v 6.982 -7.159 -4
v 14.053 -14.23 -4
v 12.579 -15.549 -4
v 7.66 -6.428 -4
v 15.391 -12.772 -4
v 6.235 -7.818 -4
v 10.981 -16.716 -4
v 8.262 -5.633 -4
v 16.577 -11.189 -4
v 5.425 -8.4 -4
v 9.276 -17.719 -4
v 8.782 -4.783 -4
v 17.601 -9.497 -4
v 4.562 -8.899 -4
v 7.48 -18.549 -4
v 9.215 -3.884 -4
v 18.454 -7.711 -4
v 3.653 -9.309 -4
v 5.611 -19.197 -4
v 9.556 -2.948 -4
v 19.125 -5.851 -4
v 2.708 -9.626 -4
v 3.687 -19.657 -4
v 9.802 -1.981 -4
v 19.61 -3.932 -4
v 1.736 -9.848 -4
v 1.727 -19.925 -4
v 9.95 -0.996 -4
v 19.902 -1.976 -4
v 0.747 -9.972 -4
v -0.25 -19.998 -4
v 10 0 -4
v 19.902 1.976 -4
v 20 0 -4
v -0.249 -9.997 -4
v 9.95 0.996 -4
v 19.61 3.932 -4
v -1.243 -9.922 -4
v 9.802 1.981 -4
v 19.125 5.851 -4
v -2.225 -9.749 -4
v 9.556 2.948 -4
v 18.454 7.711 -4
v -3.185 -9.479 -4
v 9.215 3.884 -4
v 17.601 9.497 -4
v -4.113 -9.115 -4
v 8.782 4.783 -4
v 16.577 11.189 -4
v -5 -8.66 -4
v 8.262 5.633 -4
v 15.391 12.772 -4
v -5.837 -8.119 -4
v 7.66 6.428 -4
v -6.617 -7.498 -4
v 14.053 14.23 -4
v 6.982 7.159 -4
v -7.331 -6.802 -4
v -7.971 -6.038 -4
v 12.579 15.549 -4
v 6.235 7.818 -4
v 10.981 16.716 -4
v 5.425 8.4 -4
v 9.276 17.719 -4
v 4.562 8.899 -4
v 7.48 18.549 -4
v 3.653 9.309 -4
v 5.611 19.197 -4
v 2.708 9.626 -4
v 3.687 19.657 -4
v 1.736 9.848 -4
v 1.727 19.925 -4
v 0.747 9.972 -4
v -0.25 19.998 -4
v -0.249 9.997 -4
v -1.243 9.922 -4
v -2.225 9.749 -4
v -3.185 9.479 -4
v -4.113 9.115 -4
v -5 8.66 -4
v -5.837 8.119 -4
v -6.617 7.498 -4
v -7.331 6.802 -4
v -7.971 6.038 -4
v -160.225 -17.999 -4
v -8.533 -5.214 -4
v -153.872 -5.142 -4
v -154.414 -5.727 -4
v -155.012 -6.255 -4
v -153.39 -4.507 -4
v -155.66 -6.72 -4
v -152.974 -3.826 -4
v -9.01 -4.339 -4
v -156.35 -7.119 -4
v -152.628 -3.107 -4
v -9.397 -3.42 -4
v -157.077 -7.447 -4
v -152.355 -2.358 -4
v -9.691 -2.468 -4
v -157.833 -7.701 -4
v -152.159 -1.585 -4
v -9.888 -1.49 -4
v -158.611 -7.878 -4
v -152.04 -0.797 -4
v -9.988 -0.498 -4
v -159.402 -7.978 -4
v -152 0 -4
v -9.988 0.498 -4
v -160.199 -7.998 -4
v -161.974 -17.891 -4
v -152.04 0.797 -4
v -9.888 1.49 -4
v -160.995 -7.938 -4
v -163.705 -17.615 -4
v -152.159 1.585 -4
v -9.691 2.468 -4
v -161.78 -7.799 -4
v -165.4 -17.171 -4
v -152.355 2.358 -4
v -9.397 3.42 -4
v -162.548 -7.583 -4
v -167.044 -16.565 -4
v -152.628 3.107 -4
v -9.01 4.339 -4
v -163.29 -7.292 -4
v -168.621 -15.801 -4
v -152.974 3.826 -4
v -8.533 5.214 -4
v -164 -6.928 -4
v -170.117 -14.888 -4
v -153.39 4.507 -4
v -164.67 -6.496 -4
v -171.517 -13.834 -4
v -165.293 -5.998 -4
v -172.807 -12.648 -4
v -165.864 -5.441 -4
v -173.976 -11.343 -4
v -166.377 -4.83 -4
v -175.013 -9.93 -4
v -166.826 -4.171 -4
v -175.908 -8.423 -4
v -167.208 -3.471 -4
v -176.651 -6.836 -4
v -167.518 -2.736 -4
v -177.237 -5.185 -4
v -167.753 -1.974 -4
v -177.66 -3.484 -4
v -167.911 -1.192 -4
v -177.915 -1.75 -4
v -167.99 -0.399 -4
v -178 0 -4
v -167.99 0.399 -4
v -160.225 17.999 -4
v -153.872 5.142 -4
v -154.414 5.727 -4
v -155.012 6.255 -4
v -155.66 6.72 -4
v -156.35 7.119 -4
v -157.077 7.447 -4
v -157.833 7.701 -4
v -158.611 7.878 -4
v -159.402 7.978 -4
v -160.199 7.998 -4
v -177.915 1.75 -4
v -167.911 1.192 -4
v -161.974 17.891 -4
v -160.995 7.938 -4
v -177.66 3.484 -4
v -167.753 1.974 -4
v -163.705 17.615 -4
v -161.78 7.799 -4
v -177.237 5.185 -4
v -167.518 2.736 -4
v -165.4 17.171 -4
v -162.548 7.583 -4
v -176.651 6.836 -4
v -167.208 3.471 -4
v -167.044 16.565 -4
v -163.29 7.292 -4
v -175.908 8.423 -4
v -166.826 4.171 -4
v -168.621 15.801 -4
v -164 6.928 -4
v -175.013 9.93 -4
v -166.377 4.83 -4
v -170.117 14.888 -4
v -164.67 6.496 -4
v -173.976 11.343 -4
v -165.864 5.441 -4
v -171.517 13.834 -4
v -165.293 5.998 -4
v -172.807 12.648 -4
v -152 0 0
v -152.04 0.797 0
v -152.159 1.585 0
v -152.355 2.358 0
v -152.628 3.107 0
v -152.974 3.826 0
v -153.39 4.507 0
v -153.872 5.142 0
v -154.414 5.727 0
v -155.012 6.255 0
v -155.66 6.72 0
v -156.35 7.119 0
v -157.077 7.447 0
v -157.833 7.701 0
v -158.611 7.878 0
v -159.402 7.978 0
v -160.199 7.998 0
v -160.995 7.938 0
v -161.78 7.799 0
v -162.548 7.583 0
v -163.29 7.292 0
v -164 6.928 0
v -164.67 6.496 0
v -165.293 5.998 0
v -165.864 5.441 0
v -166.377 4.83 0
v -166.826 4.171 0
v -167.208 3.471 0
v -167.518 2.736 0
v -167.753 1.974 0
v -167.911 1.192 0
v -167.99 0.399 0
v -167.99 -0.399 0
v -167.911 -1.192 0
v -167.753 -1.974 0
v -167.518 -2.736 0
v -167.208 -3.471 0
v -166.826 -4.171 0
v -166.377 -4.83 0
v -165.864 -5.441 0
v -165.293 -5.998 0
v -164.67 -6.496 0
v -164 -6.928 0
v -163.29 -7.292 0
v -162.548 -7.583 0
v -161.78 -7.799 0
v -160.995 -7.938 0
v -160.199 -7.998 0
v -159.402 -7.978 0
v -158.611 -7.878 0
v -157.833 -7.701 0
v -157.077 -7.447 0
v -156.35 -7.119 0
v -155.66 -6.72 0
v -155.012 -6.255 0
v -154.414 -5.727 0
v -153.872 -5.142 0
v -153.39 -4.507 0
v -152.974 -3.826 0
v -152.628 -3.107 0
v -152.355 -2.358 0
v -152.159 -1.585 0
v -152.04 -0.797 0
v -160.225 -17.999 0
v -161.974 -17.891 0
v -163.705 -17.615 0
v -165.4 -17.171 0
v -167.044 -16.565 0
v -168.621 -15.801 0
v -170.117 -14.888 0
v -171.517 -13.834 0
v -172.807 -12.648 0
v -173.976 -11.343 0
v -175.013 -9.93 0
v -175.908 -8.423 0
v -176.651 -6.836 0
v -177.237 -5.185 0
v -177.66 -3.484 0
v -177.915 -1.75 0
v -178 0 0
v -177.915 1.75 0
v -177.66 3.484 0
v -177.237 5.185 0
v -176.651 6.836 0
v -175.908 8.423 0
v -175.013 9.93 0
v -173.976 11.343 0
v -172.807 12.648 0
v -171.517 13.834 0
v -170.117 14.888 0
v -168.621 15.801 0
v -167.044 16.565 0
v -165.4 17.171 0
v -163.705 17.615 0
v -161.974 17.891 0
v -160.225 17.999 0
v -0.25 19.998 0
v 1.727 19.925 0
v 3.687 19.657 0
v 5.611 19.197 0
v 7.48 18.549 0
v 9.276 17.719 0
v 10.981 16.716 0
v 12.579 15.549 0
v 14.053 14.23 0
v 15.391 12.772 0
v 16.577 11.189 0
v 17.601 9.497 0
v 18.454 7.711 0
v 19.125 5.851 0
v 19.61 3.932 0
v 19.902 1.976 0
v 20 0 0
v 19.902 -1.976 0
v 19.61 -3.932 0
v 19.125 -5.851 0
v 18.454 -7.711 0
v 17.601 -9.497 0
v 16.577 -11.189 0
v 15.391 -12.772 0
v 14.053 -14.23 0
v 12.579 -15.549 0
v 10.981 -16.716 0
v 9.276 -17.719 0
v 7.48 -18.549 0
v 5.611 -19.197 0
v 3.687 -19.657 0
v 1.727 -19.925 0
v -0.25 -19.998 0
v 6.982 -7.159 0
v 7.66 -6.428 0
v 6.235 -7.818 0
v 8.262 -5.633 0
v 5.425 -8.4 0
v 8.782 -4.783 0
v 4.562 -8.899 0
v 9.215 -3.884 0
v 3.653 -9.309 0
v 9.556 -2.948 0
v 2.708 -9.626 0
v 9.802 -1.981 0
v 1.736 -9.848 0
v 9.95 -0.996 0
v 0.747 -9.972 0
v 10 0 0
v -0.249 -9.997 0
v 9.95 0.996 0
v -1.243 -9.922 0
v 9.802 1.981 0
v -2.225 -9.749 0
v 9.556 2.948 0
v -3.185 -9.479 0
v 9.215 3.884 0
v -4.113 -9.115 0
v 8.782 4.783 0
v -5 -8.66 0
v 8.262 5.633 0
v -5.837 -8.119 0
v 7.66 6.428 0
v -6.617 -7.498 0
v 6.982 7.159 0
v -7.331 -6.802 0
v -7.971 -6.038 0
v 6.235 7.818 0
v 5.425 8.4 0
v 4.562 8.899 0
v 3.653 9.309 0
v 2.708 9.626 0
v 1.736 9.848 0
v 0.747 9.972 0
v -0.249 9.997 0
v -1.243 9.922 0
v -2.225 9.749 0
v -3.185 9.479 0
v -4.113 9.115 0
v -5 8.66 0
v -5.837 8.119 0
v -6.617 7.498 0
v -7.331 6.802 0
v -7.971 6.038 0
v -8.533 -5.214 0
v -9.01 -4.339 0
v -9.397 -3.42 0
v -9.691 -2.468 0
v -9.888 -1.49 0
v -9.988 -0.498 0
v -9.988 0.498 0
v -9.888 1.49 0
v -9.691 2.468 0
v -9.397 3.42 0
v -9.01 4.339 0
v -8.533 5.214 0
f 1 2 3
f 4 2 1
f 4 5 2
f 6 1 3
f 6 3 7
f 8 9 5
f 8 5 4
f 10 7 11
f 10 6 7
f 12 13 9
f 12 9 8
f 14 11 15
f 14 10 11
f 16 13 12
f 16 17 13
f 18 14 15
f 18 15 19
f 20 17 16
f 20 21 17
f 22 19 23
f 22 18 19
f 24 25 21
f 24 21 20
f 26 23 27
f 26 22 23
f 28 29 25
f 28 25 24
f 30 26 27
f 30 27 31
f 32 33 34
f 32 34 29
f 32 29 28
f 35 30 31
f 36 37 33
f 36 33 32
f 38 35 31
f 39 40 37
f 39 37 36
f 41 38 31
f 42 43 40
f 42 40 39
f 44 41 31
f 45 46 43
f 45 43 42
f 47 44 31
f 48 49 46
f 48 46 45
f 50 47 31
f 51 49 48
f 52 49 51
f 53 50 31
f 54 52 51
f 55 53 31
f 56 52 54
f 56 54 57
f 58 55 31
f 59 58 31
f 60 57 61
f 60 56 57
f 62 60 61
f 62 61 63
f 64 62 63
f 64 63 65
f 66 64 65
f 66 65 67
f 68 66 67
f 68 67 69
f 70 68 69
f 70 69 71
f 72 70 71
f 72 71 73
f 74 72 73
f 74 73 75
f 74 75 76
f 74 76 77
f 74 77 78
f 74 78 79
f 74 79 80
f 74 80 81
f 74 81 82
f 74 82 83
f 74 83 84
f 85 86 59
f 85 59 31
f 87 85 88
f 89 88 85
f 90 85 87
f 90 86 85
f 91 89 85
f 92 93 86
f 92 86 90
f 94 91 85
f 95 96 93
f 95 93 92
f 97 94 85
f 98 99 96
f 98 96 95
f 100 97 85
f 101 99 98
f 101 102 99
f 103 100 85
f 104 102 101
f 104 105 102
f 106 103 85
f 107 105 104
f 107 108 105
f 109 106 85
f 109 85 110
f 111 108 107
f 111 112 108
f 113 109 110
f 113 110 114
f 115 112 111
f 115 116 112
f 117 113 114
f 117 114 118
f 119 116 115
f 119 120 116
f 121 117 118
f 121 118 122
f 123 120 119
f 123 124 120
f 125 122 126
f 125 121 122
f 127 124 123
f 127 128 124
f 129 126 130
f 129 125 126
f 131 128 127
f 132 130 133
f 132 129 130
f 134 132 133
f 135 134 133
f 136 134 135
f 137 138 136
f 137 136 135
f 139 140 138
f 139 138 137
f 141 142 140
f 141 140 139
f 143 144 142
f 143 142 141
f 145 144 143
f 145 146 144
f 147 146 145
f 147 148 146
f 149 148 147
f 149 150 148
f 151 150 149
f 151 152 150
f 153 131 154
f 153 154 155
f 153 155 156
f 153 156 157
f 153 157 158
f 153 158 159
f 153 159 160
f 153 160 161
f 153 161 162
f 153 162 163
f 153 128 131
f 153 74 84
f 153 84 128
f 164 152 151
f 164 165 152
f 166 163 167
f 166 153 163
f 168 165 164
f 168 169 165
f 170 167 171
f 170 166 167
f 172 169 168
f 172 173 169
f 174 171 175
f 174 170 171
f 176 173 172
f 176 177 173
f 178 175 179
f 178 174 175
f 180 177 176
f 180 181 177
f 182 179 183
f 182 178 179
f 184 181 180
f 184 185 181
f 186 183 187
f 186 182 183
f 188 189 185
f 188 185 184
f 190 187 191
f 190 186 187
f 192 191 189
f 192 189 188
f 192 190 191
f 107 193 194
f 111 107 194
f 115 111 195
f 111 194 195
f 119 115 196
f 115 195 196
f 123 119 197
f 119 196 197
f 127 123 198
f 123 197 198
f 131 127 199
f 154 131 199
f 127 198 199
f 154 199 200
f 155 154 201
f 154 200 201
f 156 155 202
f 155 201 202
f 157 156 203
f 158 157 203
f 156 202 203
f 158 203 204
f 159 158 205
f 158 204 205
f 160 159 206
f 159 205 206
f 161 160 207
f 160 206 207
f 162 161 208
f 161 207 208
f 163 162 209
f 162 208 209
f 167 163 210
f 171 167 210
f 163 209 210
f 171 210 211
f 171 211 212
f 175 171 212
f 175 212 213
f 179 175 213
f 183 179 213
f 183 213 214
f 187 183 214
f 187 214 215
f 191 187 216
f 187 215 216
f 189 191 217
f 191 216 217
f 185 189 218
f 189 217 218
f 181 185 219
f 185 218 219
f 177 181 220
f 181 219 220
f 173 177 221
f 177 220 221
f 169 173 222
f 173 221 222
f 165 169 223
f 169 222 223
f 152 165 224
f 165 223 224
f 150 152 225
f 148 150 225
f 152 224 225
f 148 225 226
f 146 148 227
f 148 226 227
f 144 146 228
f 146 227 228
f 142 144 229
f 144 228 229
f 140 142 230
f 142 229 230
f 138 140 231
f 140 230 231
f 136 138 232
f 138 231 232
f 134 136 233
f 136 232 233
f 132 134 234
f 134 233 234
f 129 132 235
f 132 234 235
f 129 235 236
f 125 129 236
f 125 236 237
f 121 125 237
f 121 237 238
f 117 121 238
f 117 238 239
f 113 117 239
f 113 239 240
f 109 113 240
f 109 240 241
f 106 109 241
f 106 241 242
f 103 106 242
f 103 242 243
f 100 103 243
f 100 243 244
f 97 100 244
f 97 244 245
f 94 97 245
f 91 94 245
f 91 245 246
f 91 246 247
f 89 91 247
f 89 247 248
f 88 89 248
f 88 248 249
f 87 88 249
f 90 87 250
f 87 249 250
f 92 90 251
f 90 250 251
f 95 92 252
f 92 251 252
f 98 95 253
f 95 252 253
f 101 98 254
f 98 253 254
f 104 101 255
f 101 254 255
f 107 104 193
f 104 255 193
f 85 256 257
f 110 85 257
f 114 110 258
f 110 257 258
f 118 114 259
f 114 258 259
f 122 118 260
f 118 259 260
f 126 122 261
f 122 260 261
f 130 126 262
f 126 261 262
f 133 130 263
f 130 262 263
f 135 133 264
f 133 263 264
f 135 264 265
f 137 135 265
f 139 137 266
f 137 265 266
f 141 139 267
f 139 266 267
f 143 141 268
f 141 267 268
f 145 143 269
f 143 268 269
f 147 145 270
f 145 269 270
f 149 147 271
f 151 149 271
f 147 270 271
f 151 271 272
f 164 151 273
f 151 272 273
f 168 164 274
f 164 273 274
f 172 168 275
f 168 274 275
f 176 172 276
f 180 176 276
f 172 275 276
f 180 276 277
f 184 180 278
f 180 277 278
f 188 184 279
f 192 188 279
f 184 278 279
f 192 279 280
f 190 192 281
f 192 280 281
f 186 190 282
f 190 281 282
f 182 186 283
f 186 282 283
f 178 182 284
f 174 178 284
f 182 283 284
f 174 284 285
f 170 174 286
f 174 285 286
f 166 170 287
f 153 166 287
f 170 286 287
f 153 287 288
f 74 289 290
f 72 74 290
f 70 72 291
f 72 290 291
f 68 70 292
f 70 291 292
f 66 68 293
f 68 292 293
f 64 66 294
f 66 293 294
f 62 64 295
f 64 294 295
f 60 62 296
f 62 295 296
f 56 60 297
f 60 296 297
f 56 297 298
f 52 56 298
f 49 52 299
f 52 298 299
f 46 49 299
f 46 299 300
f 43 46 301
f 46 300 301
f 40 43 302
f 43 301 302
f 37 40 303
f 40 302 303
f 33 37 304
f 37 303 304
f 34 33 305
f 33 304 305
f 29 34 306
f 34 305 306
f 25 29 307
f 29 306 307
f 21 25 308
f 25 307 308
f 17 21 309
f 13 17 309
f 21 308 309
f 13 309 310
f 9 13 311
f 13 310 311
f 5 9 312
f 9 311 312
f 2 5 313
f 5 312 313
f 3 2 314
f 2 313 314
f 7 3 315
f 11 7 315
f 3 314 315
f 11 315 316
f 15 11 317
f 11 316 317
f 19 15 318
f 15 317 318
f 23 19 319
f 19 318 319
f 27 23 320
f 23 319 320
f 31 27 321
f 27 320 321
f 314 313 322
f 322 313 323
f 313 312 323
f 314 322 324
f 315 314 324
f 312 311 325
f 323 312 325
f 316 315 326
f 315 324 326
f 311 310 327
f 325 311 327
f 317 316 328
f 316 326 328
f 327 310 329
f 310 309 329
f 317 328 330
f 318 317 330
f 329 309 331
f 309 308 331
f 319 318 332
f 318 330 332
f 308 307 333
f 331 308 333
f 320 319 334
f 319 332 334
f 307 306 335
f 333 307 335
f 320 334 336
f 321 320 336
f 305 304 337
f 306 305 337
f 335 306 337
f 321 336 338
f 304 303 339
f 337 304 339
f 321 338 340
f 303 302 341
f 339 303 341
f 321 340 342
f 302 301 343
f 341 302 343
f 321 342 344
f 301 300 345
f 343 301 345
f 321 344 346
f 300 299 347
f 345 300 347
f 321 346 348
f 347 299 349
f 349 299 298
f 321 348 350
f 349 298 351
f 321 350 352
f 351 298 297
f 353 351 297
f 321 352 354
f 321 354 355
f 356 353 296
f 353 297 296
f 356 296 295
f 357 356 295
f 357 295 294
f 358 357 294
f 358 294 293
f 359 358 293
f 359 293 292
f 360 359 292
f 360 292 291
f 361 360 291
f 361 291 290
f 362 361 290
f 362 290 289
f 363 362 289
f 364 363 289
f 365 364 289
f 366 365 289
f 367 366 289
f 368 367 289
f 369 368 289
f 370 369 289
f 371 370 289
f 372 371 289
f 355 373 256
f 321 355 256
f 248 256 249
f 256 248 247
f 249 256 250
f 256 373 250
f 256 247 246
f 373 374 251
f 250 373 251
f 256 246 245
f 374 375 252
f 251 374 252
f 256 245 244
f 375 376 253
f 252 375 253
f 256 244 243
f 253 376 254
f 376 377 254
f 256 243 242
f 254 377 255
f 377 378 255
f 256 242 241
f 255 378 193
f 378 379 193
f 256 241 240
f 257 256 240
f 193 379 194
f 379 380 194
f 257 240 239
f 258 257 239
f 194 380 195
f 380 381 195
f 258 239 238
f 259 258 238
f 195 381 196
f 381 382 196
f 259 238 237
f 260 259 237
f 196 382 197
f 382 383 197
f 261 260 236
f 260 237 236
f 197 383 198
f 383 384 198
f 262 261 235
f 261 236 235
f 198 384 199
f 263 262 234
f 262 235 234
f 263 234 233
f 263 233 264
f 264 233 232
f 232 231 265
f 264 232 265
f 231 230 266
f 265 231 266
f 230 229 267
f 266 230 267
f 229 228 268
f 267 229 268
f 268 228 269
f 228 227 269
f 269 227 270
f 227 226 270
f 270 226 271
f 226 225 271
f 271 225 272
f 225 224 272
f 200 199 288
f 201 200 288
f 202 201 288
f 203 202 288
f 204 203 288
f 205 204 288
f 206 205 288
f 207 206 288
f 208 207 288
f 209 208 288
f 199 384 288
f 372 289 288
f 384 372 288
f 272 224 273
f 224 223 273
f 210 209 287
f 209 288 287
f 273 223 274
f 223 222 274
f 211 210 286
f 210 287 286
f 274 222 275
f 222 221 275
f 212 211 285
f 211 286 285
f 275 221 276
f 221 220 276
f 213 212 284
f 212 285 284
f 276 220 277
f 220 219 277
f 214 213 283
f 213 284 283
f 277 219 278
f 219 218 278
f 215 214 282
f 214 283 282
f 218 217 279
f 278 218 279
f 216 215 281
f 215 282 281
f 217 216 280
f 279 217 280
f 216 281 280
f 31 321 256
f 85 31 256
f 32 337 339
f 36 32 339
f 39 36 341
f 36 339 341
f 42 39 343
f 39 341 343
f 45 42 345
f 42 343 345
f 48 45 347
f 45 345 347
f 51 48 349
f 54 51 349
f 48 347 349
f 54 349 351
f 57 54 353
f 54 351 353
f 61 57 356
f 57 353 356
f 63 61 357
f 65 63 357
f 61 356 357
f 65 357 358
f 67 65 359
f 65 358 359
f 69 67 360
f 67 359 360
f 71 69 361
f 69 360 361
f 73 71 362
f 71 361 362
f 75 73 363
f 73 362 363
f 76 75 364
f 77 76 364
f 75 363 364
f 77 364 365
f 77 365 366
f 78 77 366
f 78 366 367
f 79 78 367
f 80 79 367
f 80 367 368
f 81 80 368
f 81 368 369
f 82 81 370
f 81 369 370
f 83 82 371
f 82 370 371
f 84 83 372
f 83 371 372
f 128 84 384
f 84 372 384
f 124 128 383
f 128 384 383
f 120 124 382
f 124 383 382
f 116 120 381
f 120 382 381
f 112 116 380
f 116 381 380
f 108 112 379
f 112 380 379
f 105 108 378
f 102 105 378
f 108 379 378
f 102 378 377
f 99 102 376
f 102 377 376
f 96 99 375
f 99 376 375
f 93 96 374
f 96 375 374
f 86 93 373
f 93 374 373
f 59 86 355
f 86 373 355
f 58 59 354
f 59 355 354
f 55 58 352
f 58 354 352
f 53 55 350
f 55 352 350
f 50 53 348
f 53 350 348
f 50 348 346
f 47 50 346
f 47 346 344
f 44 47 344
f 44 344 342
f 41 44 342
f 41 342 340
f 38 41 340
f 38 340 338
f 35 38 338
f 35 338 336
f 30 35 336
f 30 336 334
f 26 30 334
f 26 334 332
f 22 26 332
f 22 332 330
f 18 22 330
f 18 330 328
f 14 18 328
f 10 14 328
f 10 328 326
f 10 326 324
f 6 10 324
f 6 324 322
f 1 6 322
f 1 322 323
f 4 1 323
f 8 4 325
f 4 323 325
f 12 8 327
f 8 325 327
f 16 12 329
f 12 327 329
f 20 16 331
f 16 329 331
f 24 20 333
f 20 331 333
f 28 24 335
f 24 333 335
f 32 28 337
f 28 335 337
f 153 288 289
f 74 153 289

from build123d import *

# Parameters (mm, degrees)
SKETCH_2_R             = 8
SKETCH_2_R_2           = 10
SM_BASE_FLANGE_1_DEPTH = 4


# Sheet-metal steps are written as plain solids
with BuildPart() as part:
    # Sketch 2 → Базовая кромка1 (new body)
    with BuildSketch(Plane.XY):
        with BuildLine():
            Line((-160.225, 17.998593695), (-0.25, 19.998437439))
            ThreePointArc((-0.25, 19.998437439), (20, 0), (-0.25, -19.998437439))
            Line((-0.25, -19.998437439), (-160.225, -17.998593695))
            ThreePointArc((-160.225, -17.998593695), (-178, 0), (-160.225, 17.998593695))
        make_face()
        with Locations((-160, 0)):
            Circle(SKETCH_2_R, mode=Mode.SUBTRACT)
        Circle(SKETCH_2_R_2, mode=Mode.SUBTRACT)
    extrude(amount=-SM_BASE_FLANGE_1_DEPTH)


solid = part.part
